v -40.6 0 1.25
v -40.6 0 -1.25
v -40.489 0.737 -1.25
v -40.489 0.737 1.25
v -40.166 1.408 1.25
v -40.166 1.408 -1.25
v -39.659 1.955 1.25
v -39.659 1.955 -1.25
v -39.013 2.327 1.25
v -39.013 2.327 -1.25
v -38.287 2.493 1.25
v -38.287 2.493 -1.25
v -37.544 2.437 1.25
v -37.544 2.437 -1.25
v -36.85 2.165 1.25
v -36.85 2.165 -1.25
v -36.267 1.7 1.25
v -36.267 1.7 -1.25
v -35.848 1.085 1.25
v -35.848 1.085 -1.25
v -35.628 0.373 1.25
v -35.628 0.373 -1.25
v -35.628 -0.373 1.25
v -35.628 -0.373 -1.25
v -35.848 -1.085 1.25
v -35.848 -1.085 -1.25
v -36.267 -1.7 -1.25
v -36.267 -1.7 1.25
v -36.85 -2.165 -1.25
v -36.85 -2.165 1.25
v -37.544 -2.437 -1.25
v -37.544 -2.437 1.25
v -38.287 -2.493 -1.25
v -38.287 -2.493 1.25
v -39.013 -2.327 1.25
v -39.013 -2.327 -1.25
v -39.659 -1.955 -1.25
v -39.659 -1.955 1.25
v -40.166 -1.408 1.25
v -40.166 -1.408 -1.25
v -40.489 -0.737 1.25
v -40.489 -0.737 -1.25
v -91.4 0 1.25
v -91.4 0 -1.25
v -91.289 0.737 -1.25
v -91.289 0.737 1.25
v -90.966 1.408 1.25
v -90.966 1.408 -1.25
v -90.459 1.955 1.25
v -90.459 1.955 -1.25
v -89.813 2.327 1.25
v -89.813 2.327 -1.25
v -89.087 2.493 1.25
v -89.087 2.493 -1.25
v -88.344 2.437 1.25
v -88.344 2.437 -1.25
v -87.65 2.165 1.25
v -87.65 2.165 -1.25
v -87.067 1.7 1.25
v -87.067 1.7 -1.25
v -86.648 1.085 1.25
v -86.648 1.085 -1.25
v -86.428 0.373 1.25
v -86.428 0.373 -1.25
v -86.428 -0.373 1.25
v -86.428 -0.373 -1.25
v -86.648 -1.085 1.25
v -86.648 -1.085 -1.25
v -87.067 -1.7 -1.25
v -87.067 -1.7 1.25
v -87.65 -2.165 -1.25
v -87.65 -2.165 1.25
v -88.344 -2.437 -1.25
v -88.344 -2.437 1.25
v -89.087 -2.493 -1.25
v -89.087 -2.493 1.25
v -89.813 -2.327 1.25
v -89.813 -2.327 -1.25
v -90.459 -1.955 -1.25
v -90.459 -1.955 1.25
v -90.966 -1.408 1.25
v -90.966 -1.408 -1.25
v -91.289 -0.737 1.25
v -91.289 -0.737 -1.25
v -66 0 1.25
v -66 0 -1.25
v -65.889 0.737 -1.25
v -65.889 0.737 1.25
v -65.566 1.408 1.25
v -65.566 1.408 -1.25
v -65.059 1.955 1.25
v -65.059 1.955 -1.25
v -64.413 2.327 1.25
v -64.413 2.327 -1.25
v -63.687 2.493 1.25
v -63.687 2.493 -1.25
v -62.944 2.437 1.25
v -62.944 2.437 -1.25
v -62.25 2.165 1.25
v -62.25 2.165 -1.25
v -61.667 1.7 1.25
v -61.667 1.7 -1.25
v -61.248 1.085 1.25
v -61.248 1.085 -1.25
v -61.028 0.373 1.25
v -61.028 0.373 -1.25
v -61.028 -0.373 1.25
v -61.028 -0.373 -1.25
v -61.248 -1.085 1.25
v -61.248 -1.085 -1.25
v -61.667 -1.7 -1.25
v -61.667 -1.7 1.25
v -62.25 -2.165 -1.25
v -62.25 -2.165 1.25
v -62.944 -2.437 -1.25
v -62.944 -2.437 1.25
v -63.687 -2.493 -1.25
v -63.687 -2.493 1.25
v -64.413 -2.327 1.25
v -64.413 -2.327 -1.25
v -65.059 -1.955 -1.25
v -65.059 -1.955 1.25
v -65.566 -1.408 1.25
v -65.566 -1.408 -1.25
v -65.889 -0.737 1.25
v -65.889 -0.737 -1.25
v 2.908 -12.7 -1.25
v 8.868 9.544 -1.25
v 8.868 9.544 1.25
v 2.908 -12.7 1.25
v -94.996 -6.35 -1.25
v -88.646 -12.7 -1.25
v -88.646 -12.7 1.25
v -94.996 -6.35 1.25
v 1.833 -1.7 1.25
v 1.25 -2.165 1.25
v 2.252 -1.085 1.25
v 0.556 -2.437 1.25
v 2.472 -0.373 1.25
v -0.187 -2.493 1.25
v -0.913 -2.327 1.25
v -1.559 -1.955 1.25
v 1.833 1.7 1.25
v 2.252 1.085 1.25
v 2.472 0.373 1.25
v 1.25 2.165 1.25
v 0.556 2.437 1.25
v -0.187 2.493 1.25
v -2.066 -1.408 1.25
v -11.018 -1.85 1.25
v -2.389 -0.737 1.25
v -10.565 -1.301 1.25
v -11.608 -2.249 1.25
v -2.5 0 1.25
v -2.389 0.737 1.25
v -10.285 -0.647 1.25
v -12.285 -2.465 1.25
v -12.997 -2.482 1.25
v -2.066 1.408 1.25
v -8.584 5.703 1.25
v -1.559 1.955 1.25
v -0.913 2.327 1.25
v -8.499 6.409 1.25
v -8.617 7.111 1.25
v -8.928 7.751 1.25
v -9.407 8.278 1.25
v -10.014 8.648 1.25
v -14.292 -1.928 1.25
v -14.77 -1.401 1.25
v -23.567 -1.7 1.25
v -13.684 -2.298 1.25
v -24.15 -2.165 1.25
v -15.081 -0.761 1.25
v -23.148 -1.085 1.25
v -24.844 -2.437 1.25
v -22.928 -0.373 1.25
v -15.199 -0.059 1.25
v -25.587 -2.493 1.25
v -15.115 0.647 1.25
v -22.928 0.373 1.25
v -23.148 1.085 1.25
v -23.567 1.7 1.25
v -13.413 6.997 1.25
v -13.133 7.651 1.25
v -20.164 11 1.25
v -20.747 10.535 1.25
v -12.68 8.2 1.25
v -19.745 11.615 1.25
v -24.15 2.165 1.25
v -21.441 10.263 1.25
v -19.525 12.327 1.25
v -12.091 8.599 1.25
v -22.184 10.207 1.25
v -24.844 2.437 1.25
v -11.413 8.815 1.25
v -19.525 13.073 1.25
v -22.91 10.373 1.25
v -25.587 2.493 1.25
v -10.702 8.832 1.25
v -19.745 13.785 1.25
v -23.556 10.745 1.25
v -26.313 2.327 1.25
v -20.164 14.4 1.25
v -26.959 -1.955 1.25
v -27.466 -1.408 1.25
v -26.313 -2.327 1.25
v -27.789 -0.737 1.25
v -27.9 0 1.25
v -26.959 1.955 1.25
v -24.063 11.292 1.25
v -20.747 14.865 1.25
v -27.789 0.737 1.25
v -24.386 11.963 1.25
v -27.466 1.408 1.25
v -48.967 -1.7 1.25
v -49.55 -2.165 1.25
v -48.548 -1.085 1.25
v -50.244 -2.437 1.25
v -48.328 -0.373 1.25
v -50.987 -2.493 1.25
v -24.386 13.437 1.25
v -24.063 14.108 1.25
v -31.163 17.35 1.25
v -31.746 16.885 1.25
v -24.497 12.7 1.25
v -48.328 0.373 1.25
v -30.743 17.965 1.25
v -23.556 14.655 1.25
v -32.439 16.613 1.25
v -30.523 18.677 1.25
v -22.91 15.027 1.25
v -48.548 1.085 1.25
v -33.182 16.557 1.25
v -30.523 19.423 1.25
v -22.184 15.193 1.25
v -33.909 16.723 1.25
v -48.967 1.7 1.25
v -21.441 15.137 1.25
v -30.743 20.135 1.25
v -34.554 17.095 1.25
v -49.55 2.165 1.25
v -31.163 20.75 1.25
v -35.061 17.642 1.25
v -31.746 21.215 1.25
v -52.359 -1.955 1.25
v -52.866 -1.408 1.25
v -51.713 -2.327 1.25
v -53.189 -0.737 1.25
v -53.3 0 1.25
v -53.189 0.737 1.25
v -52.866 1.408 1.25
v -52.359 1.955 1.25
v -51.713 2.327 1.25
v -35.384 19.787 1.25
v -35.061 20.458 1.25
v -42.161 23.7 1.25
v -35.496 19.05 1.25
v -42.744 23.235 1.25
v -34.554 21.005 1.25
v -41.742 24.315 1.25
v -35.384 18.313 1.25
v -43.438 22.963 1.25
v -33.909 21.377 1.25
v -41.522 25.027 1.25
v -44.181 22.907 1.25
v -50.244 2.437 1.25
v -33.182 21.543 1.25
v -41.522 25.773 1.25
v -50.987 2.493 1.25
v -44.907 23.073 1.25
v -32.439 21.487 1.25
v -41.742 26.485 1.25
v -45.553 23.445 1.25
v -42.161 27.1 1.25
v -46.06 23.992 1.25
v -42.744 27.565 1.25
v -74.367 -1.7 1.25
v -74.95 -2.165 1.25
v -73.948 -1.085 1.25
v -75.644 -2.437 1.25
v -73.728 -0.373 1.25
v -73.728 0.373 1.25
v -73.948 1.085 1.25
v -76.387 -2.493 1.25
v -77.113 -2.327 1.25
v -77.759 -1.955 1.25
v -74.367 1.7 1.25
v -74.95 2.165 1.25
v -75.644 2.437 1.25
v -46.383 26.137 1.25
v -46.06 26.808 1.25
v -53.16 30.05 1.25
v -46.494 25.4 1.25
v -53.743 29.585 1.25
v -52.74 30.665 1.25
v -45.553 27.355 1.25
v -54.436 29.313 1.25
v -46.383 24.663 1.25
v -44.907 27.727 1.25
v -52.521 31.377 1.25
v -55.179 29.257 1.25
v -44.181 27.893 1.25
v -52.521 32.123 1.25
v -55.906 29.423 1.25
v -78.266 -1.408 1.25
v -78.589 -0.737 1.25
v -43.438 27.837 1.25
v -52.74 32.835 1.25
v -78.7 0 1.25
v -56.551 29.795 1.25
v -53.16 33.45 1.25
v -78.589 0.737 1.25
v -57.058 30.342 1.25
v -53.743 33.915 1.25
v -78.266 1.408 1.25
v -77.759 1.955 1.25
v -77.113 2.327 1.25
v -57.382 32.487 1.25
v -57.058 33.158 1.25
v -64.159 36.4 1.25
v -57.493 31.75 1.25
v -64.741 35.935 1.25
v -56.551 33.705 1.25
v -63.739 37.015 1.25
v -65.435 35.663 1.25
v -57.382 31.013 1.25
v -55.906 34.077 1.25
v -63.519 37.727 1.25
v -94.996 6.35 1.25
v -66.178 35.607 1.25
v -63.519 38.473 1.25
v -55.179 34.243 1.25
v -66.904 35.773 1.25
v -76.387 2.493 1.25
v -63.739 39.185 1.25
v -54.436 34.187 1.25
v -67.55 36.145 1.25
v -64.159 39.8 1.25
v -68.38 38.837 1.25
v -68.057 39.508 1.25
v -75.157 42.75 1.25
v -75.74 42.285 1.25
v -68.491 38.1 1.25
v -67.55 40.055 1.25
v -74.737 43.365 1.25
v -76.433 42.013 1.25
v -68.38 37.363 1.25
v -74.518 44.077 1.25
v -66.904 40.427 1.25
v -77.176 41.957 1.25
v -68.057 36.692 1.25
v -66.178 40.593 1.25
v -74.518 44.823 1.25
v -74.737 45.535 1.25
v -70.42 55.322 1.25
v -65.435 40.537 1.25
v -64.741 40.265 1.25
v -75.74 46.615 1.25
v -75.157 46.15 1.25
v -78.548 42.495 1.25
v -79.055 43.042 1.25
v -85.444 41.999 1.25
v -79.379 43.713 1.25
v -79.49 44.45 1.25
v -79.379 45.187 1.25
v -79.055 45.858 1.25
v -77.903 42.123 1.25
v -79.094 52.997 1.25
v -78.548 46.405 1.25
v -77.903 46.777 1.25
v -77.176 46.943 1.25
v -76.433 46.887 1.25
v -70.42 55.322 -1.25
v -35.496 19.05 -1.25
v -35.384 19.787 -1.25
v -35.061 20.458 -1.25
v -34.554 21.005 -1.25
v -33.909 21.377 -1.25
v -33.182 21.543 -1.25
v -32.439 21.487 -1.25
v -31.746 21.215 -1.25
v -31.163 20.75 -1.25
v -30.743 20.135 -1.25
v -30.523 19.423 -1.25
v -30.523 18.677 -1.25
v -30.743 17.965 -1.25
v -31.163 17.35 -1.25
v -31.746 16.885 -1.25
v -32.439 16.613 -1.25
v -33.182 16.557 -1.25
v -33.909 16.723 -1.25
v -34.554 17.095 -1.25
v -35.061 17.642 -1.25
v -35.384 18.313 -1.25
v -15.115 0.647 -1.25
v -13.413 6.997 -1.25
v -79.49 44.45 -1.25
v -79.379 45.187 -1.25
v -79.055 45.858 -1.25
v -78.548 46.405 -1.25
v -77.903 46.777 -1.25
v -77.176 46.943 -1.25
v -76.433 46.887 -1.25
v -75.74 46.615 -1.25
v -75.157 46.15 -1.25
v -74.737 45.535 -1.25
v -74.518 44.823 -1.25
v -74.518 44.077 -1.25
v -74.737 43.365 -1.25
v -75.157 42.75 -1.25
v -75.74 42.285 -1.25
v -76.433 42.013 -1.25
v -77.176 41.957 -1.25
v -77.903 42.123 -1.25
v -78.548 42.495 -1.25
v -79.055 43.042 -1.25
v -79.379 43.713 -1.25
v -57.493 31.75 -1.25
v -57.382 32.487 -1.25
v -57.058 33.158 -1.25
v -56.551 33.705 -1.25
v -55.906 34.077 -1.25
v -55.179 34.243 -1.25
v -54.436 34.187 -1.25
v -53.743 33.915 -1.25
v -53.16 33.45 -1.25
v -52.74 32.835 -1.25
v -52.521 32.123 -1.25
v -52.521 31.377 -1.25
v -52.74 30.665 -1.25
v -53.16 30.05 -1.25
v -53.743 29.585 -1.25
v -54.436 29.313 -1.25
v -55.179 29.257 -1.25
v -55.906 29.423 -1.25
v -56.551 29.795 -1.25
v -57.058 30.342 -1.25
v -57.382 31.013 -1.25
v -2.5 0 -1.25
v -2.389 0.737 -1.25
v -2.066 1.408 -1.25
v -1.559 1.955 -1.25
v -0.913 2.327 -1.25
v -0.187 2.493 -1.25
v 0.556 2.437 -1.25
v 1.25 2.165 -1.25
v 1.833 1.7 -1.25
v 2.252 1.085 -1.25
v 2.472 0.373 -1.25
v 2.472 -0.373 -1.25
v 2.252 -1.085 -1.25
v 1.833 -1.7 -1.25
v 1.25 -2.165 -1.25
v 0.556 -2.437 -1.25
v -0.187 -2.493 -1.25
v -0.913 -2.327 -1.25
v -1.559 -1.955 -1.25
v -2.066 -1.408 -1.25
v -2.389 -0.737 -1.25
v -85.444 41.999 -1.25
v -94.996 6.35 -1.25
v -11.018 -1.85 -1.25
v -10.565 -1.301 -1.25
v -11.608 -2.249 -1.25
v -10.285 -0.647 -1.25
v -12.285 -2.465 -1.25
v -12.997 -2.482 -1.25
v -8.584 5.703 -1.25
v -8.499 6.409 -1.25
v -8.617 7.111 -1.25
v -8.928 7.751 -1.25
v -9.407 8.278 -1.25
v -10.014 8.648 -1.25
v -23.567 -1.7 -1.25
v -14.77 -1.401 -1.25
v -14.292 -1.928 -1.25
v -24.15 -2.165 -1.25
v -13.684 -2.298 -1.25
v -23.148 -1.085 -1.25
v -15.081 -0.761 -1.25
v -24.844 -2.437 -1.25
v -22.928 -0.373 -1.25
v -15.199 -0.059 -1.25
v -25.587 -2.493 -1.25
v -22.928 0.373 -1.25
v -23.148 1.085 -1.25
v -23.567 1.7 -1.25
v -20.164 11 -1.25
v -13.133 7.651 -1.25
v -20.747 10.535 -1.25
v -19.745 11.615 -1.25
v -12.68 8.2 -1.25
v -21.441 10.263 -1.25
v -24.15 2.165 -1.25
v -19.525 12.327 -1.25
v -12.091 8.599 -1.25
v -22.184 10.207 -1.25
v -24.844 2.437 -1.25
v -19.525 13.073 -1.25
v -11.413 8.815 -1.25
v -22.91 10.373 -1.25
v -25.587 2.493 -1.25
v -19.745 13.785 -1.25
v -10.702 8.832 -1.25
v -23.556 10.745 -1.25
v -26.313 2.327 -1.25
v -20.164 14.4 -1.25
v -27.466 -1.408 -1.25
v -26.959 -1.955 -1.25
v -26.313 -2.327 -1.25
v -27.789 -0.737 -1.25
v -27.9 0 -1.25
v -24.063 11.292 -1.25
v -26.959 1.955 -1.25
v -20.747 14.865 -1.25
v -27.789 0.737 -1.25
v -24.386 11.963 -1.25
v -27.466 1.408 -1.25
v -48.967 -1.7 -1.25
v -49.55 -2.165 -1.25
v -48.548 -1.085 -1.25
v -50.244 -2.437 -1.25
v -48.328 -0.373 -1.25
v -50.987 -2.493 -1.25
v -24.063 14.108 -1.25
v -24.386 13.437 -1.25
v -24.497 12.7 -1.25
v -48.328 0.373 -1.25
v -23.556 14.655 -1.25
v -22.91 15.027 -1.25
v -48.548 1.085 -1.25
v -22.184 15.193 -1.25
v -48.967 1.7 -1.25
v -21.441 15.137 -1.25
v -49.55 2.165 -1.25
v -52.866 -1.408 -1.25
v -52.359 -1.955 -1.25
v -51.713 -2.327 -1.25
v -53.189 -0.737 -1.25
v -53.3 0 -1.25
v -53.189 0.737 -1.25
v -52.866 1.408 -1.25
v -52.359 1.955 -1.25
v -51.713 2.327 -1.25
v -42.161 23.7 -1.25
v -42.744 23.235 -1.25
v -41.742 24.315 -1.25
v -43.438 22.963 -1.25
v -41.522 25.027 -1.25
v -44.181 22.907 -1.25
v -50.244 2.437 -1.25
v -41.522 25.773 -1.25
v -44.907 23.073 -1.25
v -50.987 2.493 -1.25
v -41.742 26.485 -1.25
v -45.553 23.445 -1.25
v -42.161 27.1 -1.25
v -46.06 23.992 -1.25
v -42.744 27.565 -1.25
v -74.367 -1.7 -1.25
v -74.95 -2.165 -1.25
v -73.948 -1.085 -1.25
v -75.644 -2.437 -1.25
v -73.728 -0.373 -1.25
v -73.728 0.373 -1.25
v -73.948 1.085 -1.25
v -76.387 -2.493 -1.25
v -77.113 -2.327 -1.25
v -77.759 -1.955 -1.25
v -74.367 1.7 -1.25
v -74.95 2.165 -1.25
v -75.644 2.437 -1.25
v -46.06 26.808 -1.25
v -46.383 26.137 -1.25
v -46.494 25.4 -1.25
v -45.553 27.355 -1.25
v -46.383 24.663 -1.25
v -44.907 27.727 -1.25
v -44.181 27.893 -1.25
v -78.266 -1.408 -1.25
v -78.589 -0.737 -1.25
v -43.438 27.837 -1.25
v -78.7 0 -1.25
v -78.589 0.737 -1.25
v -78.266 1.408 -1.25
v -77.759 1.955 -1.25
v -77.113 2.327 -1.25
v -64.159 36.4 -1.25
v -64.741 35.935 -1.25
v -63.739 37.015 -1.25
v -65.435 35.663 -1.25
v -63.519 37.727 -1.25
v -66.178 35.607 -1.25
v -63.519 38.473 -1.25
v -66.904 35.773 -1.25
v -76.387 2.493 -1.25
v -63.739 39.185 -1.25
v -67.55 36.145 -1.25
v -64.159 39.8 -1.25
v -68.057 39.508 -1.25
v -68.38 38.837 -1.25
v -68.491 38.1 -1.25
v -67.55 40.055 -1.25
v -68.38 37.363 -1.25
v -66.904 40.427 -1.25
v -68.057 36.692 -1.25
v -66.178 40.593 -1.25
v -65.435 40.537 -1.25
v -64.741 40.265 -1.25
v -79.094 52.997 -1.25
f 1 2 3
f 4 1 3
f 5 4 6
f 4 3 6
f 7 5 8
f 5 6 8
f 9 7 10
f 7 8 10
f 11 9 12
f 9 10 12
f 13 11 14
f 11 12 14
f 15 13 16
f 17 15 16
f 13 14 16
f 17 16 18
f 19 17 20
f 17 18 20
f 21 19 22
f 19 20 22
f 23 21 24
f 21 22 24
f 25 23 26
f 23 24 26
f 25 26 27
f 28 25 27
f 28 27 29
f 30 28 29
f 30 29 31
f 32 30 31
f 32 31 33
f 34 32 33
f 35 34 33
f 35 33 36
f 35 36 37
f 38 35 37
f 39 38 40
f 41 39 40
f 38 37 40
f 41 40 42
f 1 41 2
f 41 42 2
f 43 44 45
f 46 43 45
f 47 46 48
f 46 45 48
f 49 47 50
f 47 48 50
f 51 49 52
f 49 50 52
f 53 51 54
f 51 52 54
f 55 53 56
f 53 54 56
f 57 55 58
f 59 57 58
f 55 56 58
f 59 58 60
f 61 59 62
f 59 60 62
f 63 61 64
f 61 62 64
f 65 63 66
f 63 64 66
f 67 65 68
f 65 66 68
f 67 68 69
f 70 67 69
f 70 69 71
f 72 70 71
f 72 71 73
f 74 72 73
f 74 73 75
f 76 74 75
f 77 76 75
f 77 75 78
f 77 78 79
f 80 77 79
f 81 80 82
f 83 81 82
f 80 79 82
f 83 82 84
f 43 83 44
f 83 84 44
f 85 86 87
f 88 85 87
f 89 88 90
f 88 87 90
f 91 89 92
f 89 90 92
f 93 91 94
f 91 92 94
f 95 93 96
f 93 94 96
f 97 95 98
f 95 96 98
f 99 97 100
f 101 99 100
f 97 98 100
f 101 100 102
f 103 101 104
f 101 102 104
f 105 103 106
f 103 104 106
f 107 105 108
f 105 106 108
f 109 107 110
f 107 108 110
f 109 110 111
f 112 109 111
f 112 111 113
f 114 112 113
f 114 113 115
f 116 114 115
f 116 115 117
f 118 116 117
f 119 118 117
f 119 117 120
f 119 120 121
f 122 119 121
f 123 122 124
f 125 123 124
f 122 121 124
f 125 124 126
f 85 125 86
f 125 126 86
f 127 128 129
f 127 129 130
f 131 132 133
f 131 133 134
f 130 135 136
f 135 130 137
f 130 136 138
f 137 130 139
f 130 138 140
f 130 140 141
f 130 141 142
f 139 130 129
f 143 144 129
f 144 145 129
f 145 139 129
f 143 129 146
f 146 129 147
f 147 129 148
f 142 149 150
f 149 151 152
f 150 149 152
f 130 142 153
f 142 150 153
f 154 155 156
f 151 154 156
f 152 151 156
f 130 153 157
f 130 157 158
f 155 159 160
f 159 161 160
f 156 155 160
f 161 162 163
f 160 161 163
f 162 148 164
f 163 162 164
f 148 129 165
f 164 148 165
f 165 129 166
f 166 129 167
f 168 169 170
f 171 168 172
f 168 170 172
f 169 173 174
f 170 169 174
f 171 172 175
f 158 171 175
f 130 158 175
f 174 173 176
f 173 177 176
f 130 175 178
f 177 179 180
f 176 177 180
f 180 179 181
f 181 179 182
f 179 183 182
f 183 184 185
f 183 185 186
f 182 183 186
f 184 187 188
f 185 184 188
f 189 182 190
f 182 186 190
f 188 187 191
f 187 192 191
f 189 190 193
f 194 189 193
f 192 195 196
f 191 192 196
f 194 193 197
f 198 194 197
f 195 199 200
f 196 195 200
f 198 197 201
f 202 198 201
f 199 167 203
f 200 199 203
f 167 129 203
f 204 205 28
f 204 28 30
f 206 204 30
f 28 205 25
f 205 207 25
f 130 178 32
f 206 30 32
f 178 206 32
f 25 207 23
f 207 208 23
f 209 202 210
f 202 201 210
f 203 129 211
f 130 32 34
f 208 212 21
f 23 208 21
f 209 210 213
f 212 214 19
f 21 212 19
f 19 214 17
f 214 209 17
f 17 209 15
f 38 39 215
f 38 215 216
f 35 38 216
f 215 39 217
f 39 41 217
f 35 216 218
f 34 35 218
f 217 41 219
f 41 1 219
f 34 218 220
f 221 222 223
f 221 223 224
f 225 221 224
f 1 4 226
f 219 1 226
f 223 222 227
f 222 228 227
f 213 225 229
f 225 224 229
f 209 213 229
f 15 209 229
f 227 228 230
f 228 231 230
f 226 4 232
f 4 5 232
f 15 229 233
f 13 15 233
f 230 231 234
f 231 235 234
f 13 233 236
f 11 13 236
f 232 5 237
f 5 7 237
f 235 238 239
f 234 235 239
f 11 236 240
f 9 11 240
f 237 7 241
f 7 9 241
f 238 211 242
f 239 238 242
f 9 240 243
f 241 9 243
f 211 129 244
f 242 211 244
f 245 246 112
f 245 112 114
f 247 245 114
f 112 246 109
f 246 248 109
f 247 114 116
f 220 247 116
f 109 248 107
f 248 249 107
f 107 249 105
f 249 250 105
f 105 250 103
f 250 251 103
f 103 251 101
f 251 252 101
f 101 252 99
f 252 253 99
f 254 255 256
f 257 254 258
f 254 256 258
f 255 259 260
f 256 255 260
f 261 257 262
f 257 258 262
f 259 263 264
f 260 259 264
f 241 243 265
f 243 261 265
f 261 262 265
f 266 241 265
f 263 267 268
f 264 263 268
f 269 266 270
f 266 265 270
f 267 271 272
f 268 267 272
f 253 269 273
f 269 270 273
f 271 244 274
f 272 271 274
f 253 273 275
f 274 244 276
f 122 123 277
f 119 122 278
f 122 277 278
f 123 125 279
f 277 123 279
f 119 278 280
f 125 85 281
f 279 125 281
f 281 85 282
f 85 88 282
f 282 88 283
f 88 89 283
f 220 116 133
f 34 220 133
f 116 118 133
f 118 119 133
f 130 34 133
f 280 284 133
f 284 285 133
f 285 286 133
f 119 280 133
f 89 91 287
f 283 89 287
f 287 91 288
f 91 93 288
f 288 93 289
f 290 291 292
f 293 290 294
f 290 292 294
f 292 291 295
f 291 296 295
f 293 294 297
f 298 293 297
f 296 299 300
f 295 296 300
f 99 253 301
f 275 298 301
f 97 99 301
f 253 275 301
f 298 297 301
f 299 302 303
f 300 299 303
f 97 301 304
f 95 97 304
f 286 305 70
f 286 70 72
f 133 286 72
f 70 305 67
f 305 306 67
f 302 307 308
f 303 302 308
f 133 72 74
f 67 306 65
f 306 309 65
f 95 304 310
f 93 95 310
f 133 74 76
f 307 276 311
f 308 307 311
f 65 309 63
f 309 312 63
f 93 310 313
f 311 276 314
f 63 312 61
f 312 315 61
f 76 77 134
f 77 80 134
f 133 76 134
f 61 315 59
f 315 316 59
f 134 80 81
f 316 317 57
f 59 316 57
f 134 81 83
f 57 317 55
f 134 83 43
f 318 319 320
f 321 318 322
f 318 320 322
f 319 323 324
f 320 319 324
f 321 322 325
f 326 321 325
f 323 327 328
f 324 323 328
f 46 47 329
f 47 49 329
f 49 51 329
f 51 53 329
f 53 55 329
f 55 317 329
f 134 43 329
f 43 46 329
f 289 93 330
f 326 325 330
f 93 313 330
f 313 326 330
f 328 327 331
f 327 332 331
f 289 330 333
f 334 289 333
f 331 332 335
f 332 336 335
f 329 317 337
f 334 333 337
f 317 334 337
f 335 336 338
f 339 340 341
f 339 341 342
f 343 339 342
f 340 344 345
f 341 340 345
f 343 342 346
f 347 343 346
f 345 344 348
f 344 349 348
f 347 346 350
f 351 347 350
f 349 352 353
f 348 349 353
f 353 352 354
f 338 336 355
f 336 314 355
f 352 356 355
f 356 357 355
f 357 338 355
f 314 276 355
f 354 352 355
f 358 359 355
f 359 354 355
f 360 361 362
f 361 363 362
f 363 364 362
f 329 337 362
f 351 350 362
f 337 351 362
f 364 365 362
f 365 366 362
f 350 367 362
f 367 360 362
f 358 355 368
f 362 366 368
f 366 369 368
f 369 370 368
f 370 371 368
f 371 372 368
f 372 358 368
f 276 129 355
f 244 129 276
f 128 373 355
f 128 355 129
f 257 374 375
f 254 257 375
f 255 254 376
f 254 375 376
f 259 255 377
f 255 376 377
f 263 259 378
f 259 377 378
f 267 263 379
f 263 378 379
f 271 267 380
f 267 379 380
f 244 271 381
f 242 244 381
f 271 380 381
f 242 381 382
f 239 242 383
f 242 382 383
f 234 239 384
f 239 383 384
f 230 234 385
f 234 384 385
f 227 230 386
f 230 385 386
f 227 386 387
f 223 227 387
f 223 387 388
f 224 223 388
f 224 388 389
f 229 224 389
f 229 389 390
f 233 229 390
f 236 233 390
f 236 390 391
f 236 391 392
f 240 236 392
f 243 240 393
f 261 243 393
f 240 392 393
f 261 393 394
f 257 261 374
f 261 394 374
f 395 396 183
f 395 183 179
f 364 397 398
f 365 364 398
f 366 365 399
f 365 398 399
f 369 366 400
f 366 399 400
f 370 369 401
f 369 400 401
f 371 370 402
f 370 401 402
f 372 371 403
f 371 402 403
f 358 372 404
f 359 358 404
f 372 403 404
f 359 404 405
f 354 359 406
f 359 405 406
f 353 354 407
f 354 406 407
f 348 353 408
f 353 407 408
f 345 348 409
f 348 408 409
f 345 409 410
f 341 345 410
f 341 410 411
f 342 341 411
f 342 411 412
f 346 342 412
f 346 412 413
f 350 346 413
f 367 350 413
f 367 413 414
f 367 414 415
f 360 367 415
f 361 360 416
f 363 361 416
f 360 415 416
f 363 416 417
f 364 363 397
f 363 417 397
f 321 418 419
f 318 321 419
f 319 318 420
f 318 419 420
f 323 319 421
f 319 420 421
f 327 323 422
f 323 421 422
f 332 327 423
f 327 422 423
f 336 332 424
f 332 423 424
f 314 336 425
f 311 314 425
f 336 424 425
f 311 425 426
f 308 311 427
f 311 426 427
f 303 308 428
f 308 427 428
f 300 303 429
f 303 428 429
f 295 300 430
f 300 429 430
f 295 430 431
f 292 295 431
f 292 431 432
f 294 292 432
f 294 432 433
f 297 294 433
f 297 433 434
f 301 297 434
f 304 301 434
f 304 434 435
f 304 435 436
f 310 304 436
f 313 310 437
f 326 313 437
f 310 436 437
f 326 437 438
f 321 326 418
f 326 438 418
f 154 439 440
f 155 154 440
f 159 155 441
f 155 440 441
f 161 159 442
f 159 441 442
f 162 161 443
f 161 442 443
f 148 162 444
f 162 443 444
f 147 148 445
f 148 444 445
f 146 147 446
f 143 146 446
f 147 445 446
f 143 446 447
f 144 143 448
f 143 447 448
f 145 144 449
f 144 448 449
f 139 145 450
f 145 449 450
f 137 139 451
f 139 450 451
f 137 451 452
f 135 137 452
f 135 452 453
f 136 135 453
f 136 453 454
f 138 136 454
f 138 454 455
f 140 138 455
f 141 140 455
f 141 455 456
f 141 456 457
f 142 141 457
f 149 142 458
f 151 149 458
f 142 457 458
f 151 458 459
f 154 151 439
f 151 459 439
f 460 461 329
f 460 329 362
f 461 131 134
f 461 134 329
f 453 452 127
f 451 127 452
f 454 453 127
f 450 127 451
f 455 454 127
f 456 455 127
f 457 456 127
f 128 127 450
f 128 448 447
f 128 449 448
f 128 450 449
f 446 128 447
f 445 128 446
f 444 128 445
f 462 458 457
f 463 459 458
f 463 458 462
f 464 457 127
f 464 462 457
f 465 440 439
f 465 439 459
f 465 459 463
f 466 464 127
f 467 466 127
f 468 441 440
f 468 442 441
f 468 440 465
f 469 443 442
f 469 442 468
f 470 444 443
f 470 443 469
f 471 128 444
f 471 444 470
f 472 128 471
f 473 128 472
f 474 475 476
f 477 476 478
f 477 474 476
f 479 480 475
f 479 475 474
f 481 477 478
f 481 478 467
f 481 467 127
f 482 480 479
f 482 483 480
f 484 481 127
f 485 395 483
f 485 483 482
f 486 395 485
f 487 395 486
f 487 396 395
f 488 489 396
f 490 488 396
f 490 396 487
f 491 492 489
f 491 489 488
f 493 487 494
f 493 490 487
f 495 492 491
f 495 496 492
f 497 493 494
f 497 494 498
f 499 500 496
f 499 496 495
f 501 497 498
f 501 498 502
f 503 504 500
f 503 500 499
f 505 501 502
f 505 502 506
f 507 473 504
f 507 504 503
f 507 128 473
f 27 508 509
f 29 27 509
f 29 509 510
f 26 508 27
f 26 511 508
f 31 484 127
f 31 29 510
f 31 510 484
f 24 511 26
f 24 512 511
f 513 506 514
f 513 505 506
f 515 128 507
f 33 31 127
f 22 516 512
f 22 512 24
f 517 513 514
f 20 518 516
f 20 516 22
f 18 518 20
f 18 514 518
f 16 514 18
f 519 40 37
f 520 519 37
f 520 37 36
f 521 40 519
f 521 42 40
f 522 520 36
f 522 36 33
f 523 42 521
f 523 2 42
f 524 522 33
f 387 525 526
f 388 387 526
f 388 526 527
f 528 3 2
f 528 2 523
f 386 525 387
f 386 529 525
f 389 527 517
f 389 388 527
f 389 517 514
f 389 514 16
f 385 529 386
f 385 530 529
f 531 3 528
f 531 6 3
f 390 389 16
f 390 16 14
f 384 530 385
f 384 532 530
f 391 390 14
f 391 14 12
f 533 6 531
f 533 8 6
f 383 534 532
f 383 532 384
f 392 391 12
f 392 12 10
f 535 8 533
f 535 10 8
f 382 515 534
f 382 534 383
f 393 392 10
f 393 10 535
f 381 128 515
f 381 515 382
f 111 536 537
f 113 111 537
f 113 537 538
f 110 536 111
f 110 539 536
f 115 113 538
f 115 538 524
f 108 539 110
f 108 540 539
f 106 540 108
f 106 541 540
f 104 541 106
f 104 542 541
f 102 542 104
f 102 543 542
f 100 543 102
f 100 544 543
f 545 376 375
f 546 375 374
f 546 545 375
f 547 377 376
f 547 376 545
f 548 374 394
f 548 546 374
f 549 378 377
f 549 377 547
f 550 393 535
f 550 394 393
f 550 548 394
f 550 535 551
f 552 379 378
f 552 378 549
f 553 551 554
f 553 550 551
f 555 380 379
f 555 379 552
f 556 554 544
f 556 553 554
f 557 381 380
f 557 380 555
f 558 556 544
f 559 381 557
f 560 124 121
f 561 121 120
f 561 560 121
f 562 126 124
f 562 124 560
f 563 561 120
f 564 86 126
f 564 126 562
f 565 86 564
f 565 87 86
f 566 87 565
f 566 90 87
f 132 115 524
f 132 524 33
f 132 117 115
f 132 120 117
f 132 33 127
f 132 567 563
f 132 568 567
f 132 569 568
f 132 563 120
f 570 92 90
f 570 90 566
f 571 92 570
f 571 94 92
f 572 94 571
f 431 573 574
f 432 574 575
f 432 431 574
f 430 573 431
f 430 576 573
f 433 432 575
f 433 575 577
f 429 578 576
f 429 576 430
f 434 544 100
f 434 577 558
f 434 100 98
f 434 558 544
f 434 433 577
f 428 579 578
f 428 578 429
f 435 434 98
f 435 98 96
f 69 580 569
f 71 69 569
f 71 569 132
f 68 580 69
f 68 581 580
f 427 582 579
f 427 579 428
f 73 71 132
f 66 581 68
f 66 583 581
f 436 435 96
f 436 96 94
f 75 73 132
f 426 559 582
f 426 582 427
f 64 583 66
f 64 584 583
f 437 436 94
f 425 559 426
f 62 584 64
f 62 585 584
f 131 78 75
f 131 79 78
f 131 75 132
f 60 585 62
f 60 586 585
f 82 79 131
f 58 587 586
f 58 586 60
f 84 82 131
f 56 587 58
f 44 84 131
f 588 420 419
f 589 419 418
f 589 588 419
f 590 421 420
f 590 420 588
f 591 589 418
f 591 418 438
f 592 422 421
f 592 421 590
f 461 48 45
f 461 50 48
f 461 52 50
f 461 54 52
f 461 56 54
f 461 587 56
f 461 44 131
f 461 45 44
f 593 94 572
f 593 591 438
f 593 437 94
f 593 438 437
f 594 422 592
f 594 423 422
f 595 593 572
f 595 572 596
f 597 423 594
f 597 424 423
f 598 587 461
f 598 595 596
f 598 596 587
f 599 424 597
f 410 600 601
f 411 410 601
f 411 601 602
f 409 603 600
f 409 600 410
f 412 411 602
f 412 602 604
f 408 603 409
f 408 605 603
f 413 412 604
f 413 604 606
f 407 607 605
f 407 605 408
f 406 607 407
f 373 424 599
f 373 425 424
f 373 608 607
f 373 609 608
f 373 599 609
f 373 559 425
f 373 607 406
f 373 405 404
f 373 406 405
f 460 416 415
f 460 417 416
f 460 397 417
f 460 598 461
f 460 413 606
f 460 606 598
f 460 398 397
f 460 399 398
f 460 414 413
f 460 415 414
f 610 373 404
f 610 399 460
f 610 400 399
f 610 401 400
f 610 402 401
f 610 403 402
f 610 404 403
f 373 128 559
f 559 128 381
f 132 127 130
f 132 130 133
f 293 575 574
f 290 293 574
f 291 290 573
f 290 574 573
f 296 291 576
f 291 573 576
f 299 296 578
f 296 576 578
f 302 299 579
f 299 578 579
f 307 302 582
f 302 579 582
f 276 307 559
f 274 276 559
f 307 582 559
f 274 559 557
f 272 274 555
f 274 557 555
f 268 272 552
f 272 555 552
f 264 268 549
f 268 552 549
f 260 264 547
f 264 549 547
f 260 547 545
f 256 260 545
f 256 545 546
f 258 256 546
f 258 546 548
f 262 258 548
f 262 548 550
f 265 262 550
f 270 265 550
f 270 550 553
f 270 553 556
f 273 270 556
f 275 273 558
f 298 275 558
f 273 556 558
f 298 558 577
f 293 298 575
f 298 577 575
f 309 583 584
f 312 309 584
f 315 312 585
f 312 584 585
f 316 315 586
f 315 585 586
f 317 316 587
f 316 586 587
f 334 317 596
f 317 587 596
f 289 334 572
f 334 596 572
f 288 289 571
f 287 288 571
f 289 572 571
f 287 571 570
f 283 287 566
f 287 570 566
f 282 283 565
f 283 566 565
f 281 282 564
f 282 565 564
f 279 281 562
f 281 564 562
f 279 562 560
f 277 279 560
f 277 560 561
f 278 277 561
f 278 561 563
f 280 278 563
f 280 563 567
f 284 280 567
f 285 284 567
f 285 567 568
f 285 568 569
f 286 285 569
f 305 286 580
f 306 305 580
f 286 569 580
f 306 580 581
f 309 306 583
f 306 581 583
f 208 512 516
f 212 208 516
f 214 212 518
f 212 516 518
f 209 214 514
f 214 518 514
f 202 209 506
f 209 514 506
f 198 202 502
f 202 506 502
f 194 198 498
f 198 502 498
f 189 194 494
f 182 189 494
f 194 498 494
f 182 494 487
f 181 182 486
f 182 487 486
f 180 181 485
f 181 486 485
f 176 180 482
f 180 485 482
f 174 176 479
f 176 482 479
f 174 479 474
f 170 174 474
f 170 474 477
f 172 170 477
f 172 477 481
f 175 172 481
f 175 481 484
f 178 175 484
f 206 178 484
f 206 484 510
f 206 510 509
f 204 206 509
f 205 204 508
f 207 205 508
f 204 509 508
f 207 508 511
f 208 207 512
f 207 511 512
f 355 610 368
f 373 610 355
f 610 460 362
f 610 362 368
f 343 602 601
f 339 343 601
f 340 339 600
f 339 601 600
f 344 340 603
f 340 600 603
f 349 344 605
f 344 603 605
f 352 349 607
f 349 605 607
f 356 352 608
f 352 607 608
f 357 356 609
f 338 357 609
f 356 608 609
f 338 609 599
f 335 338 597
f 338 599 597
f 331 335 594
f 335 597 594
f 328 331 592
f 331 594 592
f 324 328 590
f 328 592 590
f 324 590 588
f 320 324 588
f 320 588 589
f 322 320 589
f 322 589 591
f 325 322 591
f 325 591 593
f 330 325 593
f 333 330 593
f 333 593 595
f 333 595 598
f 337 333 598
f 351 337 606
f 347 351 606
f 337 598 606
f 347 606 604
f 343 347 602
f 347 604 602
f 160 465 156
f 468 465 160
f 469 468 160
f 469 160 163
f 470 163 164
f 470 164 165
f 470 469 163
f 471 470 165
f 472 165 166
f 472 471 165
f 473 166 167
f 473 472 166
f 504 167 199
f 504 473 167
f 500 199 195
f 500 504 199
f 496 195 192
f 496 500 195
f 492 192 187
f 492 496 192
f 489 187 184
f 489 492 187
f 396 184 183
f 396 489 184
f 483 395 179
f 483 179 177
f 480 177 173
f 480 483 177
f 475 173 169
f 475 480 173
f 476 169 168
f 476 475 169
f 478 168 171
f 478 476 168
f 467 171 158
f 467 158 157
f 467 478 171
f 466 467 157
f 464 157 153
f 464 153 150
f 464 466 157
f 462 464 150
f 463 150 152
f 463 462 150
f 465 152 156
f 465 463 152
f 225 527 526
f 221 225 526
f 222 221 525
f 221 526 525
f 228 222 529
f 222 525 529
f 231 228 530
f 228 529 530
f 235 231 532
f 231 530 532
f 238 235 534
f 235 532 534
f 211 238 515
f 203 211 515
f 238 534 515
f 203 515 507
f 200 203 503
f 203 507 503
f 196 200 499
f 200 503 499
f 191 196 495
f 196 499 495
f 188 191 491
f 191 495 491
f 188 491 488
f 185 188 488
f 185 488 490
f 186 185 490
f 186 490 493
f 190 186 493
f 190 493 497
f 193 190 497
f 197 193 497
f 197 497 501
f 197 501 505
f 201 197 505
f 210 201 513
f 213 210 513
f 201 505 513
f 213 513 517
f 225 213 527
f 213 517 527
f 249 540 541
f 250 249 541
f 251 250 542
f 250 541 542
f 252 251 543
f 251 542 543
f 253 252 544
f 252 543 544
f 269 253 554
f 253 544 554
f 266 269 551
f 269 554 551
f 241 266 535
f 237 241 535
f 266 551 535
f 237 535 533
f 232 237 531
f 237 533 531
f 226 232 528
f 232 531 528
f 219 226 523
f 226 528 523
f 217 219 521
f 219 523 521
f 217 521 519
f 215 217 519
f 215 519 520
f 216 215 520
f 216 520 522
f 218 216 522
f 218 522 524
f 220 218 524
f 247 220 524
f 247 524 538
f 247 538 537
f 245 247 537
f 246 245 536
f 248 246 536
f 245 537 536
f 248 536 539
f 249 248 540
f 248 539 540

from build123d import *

# Parameters (mm, degrees)
SKETCH1_R           = 2.5
BOSS_EXTRUDE1_DEPTH = 2.5


with BuildPart() as part:
    # Sketch1 → Boss-Extrude1 (new body)
    with BuildSketch(Plane(origin=(0, 0, -1.25), x_dir=(-1, 0, 0), z_dir=(0, 0, -1))):
        Polygon((-2.908088852, -12.7), (88.646, -12.7), (94.996, -6.35), (94.996, 6.35), (85.443949258, 41.998738686), (79.093949258, 52.997261314), (70.419687944, 55.321522628), (-8.868478822, 9.544478202), align=None)
        with Locations((25.4, 0)):
            Circle(SKETCH1_R, mode=Mode.SUBTRACT)
        with Locations((38.1, 0)):
            Circle(SKETCH1_R, mode=Mode.SUBTRACT)
        with Locations((50.8, 0)):
            Circle(SKETCH1_R, mode=Mode.SUBTRACT)
        with Locations((63.5, 0)):
            Circle(SKETCH1_R, mode=Mode.SUBTRACT)
        Circle(SKETCH1_R, mode=Mode.SUBTRACT)
        with Locations((88.9, 0)):
            Circle(SKETCH1_R, mode=Mode.SUBTRACT)
        with Locations((76.2, 0)):
            Circle(SKETCH1_R, mode=Mode.SUBTRACT)
        with Locations((76.989658396, 44.45)):
            Circle(SKETCH1_R, mode=Mode.SUBTRACT)
        with Locations((65.991135768, 38.1)):
            Circle(SKETCH1_R, mode=Mode.SUBTRACT)
        with Locations((54.99261314, 31.75)):
            Circle(SKETCH1_R, mode=Mode.SUBTRACT)
        with Locations((43.994090512, 25.4)):
            Circle(SKETCH1_R, mode=Mode.SUBTRACT)
        with Locations((32.995567884, 19.05)):
            Circle(SKETCH1_R, mode=Mode.SUBTRACT)
        with Locations((21.997045256, 12.7)):
            Circle(SKETCH1_R, mode=Mode.SUBTRACT)
        with BuildLine():
            Line((10.285185434, -0.647047613), (8.583708062, 5.702952387))
            ThreePointArc((8.583708062, 5.702952387), (10.351475015, 8.764814566), (13.413337194, 6.997047613))
            Line((13.413337194, 6.997047613), (15.114814566, 0.647047613))
            ThreePointArc((15.114814566, 0.647047613), (13.347047613, -2.414814566), (10.285185434, -0.647047613))
        make_face(mode=Mode.SUBTRACT)
    extrude(amount=-BOSS_EXTRUDE1_DEPTH)


solid = part.part
